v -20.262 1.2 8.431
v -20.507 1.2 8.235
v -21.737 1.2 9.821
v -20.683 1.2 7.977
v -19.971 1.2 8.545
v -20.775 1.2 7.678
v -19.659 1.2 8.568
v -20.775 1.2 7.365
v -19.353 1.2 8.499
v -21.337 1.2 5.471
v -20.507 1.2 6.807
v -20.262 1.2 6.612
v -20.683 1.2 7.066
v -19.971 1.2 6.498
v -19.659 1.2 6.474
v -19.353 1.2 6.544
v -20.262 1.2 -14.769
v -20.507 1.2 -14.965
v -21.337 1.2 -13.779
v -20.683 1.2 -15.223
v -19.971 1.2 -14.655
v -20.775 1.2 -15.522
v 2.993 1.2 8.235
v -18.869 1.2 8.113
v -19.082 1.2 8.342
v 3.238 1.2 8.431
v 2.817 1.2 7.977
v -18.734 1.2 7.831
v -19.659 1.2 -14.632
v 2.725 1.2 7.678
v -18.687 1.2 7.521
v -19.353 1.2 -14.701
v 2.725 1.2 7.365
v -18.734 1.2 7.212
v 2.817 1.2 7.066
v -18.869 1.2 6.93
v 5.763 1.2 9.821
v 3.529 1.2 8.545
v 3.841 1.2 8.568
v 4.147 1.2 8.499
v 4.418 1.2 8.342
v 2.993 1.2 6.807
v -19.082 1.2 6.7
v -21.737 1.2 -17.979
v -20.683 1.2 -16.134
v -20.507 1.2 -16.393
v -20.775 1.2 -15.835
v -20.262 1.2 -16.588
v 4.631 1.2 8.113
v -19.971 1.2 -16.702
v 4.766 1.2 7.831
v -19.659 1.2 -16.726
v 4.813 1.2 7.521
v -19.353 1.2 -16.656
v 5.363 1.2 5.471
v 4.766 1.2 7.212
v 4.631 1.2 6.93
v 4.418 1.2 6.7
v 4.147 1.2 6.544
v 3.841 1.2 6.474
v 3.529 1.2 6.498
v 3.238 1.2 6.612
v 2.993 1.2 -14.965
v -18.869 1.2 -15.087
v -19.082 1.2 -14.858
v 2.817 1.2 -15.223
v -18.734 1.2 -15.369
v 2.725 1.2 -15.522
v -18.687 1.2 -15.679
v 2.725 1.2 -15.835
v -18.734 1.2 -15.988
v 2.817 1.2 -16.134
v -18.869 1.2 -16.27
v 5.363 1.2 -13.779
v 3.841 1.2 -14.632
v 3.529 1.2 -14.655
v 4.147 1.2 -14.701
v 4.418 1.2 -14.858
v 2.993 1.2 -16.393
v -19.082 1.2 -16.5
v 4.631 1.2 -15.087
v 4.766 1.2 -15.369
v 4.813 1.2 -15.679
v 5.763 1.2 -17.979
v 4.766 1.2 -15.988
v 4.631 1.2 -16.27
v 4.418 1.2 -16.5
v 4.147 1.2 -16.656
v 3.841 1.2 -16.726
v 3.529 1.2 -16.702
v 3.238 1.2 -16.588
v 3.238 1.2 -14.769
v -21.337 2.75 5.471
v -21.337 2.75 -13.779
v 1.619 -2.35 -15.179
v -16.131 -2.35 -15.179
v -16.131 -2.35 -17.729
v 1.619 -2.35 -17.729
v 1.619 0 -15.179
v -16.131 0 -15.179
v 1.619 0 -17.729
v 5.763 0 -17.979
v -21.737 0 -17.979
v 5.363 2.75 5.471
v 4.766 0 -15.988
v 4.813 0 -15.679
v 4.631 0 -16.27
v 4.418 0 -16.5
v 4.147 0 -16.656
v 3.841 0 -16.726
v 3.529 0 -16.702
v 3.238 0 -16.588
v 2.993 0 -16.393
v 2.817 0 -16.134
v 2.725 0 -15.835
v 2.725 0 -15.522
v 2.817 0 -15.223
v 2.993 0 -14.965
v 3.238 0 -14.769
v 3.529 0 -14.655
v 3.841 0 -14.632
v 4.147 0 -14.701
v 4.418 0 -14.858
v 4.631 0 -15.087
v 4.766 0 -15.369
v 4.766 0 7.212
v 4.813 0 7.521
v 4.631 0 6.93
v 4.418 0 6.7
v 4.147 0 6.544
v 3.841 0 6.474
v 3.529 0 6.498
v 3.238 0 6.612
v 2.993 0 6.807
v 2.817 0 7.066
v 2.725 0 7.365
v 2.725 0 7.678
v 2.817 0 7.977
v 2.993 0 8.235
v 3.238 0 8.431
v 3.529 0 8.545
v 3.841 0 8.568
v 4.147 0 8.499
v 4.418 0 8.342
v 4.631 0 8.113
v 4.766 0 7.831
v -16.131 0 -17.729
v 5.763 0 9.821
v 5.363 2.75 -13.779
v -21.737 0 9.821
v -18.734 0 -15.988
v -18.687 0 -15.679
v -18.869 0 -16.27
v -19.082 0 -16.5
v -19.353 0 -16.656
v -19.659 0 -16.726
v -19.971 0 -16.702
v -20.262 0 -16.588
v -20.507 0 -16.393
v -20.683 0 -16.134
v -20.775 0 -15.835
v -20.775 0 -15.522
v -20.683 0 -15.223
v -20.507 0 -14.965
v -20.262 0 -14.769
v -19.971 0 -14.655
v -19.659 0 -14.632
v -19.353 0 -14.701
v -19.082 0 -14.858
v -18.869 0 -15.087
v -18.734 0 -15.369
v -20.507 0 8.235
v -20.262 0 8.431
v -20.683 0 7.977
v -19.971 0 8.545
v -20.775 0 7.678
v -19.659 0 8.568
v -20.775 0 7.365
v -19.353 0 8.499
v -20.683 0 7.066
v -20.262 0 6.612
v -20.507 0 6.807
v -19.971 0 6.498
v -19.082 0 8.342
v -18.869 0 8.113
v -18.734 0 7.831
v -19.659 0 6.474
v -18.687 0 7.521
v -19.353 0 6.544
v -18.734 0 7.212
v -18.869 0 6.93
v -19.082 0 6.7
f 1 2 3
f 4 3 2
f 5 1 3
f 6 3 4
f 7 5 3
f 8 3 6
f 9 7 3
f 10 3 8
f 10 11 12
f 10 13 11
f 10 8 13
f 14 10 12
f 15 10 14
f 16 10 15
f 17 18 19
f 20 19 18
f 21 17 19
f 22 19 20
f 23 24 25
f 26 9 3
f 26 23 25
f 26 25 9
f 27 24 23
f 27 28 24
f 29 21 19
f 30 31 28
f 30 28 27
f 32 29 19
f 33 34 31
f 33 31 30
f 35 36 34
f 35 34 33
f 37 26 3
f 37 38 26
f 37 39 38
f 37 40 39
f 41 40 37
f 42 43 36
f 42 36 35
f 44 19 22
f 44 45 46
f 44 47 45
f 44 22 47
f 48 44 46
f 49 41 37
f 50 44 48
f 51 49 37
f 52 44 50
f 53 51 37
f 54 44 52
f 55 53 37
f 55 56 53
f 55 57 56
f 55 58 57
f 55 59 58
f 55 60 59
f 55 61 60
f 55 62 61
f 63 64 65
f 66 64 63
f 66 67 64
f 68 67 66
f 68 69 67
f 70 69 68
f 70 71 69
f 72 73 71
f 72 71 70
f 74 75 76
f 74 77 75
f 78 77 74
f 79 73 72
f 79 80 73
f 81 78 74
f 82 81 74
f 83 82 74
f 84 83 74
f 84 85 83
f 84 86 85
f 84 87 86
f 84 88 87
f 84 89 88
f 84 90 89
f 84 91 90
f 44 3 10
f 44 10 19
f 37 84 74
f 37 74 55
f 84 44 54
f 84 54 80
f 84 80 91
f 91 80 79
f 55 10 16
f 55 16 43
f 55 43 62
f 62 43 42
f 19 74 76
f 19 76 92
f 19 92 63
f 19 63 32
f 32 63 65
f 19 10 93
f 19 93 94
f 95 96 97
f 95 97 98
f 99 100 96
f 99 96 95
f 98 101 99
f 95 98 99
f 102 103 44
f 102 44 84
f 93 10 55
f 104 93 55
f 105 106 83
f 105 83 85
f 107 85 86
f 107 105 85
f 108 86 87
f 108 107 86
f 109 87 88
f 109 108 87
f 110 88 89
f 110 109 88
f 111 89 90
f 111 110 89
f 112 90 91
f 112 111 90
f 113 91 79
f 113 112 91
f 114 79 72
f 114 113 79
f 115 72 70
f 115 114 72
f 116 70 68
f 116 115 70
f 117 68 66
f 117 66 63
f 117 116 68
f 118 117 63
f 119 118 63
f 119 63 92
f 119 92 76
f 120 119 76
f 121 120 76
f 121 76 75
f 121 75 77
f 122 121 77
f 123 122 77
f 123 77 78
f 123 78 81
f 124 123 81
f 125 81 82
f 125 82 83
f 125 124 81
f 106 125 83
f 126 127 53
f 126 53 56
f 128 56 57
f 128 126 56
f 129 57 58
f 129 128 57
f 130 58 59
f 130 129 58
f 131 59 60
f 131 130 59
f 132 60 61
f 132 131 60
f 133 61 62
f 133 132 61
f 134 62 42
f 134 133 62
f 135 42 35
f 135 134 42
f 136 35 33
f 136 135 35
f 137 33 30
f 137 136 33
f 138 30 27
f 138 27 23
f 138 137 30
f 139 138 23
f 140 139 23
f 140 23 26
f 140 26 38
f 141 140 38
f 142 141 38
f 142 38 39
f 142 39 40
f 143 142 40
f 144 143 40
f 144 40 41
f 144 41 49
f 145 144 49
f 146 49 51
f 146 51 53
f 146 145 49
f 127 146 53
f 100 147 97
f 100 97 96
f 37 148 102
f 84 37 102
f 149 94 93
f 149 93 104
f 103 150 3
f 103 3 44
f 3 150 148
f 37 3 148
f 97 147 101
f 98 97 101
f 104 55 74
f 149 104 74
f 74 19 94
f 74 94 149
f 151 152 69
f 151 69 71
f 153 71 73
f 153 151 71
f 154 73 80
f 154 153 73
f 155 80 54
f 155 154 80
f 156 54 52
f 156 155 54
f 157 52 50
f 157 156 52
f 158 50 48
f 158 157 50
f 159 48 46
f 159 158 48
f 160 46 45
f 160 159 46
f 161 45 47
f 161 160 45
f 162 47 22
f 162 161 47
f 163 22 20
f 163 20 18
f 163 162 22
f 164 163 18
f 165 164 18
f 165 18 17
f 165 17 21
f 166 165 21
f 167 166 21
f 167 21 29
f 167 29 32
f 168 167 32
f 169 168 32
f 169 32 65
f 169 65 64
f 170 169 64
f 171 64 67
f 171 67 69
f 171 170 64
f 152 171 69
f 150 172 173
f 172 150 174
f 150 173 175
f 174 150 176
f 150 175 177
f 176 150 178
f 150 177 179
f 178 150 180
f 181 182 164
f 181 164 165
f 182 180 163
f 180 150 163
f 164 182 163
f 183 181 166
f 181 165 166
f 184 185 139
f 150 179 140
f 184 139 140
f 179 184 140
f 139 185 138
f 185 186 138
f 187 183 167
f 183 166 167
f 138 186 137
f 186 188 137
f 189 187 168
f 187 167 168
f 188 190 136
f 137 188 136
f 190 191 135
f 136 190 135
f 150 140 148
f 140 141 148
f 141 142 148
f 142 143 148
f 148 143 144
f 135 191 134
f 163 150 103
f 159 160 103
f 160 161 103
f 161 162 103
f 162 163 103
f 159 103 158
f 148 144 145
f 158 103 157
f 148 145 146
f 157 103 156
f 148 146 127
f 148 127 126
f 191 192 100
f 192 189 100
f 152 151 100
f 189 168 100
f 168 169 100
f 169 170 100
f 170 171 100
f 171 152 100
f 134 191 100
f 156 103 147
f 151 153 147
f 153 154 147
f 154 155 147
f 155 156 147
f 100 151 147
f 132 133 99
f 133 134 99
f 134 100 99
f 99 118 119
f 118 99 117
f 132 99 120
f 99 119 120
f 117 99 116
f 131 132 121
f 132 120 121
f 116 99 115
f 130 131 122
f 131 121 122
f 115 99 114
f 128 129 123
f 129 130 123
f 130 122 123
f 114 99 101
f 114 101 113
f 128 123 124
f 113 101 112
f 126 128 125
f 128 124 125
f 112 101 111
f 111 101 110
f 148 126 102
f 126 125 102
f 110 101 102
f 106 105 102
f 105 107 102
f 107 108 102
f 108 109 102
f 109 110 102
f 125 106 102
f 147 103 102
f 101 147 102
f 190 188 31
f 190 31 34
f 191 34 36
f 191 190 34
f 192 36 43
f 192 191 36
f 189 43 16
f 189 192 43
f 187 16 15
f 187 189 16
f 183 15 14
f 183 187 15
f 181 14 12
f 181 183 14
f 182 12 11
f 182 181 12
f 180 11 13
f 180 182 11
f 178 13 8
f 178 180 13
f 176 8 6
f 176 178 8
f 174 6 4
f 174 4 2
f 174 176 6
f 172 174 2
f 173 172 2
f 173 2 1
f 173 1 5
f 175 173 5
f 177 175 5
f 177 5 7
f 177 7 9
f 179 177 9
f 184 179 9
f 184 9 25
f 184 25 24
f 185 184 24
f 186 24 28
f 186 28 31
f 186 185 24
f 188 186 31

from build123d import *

# Parameters (mm, degrees)
SKETCH1_W           = 27.5
SKETCH1_H           = 27.8
SKETCH1_R           = 1.05
BOSS_EXTRUDE1_DEPTH = 1.2
SKETCH2_W           = 26.7
SKETCH2_H           = 19.25
BOSS_EXTRUDE2_DEPTH = 1.55
SKETCH3_W           = 17.75
SKETCH3_H           = 2.55
BOSS_EXTRUDE3_DEPTH = 2.35


with BuildPart() as part:
    # Sketch1 → Boss-Extrude1 (new body)
    with BuildSketch(Plane(origin=(0, 0, 0), x_dir=(1, 0, 0), z_dir=(0, 1, 0))):
        with Locations((-7.986995643, 4.078730041)):
            Rectangle(SKETCH1_W, SKETCH1_H)
        with Locations((-19.736995643, 15.678730041)):
            Circle(SKETCH1_R, mode=Mode.SUBTRACT)
        with Locations((3.763004357, 15.678730041)):
            Circle(SKETCH1_R, mode=Mode.SUBTRACT)
        with Locations((3.763004357, -7.521269959)):
            Circle(SKETCH1_R, mode=Mode.SUBTRACT)
        with Locations((-19.736995643, -7.521269959)):
            Circle(SKETCH1_R, mode=Mode.SUBTRACT)
    extrude(amount=BOSS_EXTRUDE1_DEPTH)

    # Sketch2 → Boss-Extrude2 (add)
    with BuildSketch(Plane(origin=(0, 1.2, 0), x_dir=(1, 0, 0), z_dir=(0, 1, 0))):
        with Locations((-7.986995643, 4.153730041)):
            Rectangle(SKETCH2_W, SKETCH2_H)
    extrude(amount=BOSS_EXTRUDE2_DEPTH)

    # Sketch3 → Boss-Extrude3 (add)
    with BuildSketch(Plane.XZ):
        with Locations((-7.256318238, -16.453730041)):
            Rectangle(SKETCH3_W, SKETCH3_H)
    extrude(amount=BOSS_EXTRUDE3_DEPTH)


solid = part.part
